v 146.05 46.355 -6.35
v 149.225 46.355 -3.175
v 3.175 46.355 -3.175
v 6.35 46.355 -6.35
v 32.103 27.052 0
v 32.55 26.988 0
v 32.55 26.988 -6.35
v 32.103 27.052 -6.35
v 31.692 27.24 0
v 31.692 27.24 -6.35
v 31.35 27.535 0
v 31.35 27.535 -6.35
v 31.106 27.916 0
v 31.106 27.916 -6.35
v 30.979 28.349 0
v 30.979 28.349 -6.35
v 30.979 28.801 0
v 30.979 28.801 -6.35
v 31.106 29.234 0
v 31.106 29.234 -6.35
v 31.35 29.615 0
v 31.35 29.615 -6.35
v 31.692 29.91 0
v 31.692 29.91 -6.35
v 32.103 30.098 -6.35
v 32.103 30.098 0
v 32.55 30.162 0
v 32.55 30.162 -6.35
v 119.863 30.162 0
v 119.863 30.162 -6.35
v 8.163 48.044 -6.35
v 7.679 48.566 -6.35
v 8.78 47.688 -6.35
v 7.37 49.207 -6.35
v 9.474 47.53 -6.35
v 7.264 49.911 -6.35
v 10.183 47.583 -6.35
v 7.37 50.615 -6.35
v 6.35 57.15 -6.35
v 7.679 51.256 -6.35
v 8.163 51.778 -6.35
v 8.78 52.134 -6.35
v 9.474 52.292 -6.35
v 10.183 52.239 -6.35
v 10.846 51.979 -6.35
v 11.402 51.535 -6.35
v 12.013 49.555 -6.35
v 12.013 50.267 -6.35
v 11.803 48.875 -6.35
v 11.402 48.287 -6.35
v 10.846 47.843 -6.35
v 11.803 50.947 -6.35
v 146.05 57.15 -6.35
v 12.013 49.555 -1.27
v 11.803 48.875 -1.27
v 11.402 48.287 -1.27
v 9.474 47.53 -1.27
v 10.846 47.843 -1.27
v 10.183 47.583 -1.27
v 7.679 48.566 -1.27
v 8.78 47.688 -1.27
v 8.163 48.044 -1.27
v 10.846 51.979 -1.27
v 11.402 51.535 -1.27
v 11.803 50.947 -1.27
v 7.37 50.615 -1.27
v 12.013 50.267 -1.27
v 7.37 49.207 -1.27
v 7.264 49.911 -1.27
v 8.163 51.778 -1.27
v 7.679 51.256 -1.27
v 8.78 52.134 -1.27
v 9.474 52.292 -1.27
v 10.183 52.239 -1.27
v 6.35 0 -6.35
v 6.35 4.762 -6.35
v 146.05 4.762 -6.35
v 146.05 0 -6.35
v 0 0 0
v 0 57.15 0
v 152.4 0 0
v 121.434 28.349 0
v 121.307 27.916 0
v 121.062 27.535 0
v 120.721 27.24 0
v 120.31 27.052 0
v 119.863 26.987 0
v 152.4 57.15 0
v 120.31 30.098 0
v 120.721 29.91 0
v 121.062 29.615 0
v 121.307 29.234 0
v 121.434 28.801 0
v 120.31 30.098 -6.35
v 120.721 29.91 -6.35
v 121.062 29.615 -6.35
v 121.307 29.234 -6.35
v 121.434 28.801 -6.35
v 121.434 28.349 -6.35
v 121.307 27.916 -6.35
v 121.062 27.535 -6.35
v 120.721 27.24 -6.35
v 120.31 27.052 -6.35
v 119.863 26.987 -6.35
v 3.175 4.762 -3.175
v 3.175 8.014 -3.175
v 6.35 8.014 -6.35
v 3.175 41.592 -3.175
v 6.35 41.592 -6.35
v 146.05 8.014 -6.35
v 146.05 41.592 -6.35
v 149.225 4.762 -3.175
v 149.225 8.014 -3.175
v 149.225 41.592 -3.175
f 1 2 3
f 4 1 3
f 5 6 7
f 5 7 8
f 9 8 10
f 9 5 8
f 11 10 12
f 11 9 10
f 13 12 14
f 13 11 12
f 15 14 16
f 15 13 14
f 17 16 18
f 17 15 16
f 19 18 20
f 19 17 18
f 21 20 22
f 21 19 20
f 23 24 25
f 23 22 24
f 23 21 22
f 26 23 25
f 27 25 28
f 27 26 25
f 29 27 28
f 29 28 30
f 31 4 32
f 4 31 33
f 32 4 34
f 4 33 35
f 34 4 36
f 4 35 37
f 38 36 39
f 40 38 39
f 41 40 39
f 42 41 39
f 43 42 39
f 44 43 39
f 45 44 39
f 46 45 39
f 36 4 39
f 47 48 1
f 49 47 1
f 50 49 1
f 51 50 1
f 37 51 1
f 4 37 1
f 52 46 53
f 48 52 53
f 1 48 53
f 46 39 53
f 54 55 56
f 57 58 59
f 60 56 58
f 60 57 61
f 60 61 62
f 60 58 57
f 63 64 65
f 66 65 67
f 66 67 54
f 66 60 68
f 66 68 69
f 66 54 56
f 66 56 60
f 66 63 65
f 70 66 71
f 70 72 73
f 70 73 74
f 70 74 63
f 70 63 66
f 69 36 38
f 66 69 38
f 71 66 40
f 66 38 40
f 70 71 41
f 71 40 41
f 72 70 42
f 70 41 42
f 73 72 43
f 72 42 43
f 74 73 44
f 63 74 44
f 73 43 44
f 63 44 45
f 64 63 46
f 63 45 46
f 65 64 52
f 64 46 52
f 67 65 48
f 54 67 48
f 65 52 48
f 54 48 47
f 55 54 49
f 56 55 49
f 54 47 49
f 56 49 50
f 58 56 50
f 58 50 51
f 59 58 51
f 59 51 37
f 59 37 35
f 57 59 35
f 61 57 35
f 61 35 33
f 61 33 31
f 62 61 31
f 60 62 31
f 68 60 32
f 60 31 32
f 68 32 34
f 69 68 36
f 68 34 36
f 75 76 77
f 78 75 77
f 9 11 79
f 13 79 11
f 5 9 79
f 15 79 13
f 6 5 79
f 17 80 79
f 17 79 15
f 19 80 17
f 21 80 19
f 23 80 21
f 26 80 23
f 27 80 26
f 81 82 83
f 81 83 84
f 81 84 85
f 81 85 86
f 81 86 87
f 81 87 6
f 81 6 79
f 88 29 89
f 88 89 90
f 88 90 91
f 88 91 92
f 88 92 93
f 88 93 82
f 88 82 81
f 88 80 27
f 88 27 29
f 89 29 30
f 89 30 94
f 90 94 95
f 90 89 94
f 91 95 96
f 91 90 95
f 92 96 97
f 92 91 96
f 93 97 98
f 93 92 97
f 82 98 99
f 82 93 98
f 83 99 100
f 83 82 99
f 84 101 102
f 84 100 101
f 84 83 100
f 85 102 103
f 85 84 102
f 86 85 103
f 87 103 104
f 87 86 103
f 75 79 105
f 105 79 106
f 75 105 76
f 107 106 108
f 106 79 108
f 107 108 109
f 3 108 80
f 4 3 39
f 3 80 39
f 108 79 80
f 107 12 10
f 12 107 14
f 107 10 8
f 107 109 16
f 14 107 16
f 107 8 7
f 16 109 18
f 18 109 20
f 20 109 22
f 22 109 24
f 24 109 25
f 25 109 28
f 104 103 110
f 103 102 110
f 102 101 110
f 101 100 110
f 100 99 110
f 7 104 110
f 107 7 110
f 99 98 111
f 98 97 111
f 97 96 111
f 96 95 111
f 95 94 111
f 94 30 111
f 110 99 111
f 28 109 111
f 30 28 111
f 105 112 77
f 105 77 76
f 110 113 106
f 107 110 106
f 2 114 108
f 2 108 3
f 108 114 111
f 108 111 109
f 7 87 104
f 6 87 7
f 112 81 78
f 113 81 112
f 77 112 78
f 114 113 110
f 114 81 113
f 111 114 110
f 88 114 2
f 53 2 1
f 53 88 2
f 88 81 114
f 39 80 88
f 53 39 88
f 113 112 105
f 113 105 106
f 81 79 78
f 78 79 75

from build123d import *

# Parameters (mm, degrees)
SKETCH1_W           = 152.4
SKETCH1_H           = 57.15
BOSS_EXTRUDE1_DEPTH = 6.35
CUT_EXTRUDE1_DEPTH  = 7.35
CUT_EXTRUDE2_DEPTH  = 58.15
SKETCH4_W           = 3.175
SKETCH4_H           = 4.7625
CUT_EXTRUDE3_DEPTH  = 153.4
SKETCH5_W           = 3.175
SKETCH5_H           = 3.2512
CUT_EXTRUDE4_DEPTH  = 153.4
SKETCH6_R           = 2.3876
CUT_EXTRUDE5_DEPTH  = 5.08


with BuildPart() as part:
    # Sketch1 → Boss-Extrude1 (new body)
    with BuildSketch(Plane.XY):
        with Locations((76.2, 28.575)):
            Rectangle(SKETCH1_W, SKETCH1_H)
    extrude(amount=-BOSS_EXTRUDE1_DEPTH)

    # Sketch2 → Cut-Extrude1 (cut, through all)
    with BuildSketch(Plane.XY):
        with BuildLine():
            Line((32.5501, 30.1625), (119.8626, 30.1625))
            ThreePointArc((119.8626, 30.1625), (121.4501, 28.575), (119.8626, 26.9875))
            Line((119.8626, 26.9875), (32.5501, 26.9875))
            ThreePointArc((32.5501, 26.9875), (30.9626, 28.575), (32.5501, 30.1625))
        make_face()
    extrude(amount=-CUT_EXTRUDE1_DEPTH, mode=Mode.SUBTRACT)

    # Sketch3 → Cut-Extrude2 (cut, through all)
    with BuildSketch(Plane(origin=(0, 57.15, 0), x_dir=(1, 0, 0), z_dir=(0, 1, 0))):
        Polygon((152.4, 0), (146.05, 6.35), (152.4, 6.35), align=None)
        Polygon((0, 0), (6.35, 6.35), (0, 6.35), align=None)
    extrude(amount=-CUT_EXTRUDE2_DEPTH, mode=Mode.SUBTRACT)

    # Sketch4 → Cut-Extrude3 (cut, through all)
    with BuildSketch(Plane(origin=(0, 0, 0), x_dir=(0, 0, -1), z_dir=(1, 0, 0))):
        with Locations((4.7625, 43.97375)):
            Rectangle(SKETCH4_W, SKETCH4_H)
    extrude(amount=CUT_EXTRUDE3_DEPTH, mode=Mode.SUBTRACT)

    # Sketch5 → Cut-Extrude4 (cut, through all)
    with BuildSketch(Plane(origin=(0, 0, 0), x_dir=(0, 0, -1), z_dir=(1, 0, 0))):
        with Locations((4.7625, 6.3881)):
            Rectangle(SKETCH5_W, SKETCH5_H)
    extrude(amount=CUT_EXTRUDE4_DEPTH, mode=Mode.SUBTRACT)

    # Sketch6 → Cut-Extrude5 (cut)
    with BuildSketch(Plane(origin=(0, 0, -6.35), x_dir=(-1, 0, 0), z_dir=(0, 0, -1))):
        with Locations((-9.652, 49.911)):
            Circle(SKETCH6_R)
    extrude(amount=-CUT_EXTRUDE5_DEPTH, mode=Mode.SUBTRACT)


solid = part.part
